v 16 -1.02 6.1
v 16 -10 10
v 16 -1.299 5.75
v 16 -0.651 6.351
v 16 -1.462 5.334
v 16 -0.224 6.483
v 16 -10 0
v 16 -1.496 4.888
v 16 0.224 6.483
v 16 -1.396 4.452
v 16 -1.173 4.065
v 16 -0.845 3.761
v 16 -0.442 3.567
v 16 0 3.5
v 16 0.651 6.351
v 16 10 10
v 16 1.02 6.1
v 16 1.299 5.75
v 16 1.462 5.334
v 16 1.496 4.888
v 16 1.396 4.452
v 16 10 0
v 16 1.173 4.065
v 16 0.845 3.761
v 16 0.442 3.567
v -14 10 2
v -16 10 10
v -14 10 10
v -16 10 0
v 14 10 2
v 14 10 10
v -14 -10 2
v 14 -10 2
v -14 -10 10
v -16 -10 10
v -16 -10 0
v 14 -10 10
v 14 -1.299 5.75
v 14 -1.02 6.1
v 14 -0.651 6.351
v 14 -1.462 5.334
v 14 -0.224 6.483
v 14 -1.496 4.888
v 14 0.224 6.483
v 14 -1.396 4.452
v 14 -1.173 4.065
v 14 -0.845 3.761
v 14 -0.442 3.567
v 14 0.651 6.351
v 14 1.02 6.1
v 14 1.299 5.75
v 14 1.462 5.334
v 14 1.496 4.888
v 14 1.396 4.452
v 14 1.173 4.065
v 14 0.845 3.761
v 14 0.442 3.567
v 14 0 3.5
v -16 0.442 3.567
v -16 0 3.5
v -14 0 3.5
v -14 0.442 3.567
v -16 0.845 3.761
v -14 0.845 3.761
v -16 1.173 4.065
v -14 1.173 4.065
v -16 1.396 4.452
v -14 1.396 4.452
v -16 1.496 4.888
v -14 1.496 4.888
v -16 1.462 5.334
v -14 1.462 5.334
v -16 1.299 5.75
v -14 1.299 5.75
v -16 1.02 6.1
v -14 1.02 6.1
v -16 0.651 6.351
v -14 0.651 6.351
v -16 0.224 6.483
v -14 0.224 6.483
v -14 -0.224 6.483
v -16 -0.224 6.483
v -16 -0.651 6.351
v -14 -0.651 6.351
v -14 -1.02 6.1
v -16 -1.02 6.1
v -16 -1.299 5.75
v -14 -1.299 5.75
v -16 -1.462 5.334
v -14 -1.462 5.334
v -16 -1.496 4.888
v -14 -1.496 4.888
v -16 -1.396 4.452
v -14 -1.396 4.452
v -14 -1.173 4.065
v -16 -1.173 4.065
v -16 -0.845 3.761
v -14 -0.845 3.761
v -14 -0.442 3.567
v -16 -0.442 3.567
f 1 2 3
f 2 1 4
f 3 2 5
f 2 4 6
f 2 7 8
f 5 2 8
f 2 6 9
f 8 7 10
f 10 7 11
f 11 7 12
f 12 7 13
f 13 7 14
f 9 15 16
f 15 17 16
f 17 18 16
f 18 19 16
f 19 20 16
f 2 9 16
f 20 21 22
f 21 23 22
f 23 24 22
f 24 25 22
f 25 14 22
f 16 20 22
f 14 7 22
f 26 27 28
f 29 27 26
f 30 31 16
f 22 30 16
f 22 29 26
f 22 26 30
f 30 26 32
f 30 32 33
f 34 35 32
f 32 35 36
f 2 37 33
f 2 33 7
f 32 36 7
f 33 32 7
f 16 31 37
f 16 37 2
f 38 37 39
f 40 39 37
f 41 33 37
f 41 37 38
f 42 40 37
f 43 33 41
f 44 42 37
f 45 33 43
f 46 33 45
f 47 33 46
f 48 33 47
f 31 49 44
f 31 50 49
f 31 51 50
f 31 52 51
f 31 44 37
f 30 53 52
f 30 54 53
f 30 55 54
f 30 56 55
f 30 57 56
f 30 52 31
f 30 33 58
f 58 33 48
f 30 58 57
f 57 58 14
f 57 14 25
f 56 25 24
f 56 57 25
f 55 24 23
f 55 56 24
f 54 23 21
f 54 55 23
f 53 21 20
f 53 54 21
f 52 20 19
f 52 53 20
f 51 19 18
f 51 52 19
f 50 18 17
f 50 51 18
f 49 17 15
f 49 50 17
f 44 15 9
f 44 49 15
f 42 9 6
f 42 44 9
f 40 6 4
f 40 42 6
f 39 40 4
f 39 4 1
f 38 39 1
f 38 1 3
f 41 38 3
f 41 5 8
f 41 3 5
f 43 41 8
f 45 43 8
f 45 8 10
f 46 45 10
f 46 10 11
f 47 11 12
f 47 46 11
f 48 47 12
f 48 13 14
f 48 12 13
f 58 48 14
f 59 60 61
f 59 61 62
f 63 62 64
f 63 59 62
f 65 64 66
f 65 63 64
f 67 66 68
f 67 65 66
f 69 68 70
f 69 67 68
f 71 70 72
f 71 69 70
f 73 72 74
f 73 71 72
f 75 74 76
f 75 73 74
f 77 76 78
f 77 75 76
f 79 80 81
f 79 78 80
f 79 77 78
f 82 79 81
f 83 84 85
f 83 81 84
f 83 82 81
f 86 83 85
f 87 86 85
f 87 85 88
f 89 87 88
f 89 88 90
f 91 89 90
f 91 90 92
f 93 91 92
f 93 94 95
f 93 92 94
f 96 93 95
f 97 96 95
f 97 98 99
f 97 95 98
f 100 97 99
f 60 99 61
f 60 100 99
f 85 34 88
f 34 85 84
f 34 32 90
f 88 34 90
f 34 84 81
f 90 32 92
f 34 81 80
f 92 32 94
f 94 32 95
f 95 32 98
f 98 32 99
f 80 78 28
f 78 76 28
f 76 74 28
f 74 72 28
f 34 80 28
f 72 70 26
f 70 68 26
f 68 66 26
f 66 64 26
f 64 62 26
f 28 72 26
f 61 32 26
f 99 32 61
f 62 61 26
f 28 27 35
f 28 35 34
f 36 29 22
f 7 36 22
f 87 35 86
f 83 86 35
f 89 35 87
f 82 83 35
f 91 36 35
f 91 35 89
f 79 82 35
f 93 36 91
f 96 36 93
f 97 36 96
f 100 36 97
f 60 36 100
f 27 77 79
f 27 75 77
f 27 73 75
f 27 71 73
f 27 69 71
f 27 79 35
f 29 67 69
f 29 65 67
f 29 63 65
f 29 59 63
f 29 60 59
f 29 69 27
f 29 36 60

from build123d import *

# Parameters (mm, degrees)
ESQUISSE1_W                  = 28
ESQUISSE1_H                  = 20
BOSS_EXTRU_1_DEPTH           = 2
ESQUISSE2_W                  = 2
ESQUISSE2_H                  = 20
BOSS_EXTRU_2_DEPTH           = 10
ENL_V_MAT_EXTRU_1_DEPTH      = 22.354156504
ENL_V_MAT_EXTRU_1_DEPTH_BACK = 22.354156504
ESQUISSE3_R                  = 1.5


with BuildPart() as part:
    # Esquisse1 → Boss.-Extru.1 (new body)
    with BuildSketch(Plane.XY):
        Rectangle(ESQUISSE1_W, ESQUISSE1_H)
    extrude(amount=BOSS_EXTRU_1_DEPTH)

    # Esquisse2 → Boss.-Extru.2 (add)
    with BuildSketch(Plane.XY):
        with Locations((-15, 0)):
            Rectangle(ESQUISSE2_W, ESQUISSE2_H)
        with Locations((15, 0)):
            Rectangle(ESQUISSE2_W, ESQUISSE2_H)
    extrude(amount=BOSS_EXTRU_2_DEPTH)

    # Esquisse3 → Enlèv. mat.-Extru.1 (cut, two sides: drawn at the far end of the back side and taken through both)
    with BuildSketch(Plane(origin=(0, 0, 0), x_dir=(0, 0, -1), z_dir=(1, 0, 0)).offset(-ENL_V_MAT_EXTRU_1_DEPTH_BACK)):
        with Locations((-5, 0)):
            Circle(ESQUISSE3_R)
    extrude(amount=ENL_V_MAT_EXTRU_1_DEPTH + ENL_V_MAT_EXTRU_1_DEPTH_BACK, mode=Mode.SUBTRACT)


solid = part.part
